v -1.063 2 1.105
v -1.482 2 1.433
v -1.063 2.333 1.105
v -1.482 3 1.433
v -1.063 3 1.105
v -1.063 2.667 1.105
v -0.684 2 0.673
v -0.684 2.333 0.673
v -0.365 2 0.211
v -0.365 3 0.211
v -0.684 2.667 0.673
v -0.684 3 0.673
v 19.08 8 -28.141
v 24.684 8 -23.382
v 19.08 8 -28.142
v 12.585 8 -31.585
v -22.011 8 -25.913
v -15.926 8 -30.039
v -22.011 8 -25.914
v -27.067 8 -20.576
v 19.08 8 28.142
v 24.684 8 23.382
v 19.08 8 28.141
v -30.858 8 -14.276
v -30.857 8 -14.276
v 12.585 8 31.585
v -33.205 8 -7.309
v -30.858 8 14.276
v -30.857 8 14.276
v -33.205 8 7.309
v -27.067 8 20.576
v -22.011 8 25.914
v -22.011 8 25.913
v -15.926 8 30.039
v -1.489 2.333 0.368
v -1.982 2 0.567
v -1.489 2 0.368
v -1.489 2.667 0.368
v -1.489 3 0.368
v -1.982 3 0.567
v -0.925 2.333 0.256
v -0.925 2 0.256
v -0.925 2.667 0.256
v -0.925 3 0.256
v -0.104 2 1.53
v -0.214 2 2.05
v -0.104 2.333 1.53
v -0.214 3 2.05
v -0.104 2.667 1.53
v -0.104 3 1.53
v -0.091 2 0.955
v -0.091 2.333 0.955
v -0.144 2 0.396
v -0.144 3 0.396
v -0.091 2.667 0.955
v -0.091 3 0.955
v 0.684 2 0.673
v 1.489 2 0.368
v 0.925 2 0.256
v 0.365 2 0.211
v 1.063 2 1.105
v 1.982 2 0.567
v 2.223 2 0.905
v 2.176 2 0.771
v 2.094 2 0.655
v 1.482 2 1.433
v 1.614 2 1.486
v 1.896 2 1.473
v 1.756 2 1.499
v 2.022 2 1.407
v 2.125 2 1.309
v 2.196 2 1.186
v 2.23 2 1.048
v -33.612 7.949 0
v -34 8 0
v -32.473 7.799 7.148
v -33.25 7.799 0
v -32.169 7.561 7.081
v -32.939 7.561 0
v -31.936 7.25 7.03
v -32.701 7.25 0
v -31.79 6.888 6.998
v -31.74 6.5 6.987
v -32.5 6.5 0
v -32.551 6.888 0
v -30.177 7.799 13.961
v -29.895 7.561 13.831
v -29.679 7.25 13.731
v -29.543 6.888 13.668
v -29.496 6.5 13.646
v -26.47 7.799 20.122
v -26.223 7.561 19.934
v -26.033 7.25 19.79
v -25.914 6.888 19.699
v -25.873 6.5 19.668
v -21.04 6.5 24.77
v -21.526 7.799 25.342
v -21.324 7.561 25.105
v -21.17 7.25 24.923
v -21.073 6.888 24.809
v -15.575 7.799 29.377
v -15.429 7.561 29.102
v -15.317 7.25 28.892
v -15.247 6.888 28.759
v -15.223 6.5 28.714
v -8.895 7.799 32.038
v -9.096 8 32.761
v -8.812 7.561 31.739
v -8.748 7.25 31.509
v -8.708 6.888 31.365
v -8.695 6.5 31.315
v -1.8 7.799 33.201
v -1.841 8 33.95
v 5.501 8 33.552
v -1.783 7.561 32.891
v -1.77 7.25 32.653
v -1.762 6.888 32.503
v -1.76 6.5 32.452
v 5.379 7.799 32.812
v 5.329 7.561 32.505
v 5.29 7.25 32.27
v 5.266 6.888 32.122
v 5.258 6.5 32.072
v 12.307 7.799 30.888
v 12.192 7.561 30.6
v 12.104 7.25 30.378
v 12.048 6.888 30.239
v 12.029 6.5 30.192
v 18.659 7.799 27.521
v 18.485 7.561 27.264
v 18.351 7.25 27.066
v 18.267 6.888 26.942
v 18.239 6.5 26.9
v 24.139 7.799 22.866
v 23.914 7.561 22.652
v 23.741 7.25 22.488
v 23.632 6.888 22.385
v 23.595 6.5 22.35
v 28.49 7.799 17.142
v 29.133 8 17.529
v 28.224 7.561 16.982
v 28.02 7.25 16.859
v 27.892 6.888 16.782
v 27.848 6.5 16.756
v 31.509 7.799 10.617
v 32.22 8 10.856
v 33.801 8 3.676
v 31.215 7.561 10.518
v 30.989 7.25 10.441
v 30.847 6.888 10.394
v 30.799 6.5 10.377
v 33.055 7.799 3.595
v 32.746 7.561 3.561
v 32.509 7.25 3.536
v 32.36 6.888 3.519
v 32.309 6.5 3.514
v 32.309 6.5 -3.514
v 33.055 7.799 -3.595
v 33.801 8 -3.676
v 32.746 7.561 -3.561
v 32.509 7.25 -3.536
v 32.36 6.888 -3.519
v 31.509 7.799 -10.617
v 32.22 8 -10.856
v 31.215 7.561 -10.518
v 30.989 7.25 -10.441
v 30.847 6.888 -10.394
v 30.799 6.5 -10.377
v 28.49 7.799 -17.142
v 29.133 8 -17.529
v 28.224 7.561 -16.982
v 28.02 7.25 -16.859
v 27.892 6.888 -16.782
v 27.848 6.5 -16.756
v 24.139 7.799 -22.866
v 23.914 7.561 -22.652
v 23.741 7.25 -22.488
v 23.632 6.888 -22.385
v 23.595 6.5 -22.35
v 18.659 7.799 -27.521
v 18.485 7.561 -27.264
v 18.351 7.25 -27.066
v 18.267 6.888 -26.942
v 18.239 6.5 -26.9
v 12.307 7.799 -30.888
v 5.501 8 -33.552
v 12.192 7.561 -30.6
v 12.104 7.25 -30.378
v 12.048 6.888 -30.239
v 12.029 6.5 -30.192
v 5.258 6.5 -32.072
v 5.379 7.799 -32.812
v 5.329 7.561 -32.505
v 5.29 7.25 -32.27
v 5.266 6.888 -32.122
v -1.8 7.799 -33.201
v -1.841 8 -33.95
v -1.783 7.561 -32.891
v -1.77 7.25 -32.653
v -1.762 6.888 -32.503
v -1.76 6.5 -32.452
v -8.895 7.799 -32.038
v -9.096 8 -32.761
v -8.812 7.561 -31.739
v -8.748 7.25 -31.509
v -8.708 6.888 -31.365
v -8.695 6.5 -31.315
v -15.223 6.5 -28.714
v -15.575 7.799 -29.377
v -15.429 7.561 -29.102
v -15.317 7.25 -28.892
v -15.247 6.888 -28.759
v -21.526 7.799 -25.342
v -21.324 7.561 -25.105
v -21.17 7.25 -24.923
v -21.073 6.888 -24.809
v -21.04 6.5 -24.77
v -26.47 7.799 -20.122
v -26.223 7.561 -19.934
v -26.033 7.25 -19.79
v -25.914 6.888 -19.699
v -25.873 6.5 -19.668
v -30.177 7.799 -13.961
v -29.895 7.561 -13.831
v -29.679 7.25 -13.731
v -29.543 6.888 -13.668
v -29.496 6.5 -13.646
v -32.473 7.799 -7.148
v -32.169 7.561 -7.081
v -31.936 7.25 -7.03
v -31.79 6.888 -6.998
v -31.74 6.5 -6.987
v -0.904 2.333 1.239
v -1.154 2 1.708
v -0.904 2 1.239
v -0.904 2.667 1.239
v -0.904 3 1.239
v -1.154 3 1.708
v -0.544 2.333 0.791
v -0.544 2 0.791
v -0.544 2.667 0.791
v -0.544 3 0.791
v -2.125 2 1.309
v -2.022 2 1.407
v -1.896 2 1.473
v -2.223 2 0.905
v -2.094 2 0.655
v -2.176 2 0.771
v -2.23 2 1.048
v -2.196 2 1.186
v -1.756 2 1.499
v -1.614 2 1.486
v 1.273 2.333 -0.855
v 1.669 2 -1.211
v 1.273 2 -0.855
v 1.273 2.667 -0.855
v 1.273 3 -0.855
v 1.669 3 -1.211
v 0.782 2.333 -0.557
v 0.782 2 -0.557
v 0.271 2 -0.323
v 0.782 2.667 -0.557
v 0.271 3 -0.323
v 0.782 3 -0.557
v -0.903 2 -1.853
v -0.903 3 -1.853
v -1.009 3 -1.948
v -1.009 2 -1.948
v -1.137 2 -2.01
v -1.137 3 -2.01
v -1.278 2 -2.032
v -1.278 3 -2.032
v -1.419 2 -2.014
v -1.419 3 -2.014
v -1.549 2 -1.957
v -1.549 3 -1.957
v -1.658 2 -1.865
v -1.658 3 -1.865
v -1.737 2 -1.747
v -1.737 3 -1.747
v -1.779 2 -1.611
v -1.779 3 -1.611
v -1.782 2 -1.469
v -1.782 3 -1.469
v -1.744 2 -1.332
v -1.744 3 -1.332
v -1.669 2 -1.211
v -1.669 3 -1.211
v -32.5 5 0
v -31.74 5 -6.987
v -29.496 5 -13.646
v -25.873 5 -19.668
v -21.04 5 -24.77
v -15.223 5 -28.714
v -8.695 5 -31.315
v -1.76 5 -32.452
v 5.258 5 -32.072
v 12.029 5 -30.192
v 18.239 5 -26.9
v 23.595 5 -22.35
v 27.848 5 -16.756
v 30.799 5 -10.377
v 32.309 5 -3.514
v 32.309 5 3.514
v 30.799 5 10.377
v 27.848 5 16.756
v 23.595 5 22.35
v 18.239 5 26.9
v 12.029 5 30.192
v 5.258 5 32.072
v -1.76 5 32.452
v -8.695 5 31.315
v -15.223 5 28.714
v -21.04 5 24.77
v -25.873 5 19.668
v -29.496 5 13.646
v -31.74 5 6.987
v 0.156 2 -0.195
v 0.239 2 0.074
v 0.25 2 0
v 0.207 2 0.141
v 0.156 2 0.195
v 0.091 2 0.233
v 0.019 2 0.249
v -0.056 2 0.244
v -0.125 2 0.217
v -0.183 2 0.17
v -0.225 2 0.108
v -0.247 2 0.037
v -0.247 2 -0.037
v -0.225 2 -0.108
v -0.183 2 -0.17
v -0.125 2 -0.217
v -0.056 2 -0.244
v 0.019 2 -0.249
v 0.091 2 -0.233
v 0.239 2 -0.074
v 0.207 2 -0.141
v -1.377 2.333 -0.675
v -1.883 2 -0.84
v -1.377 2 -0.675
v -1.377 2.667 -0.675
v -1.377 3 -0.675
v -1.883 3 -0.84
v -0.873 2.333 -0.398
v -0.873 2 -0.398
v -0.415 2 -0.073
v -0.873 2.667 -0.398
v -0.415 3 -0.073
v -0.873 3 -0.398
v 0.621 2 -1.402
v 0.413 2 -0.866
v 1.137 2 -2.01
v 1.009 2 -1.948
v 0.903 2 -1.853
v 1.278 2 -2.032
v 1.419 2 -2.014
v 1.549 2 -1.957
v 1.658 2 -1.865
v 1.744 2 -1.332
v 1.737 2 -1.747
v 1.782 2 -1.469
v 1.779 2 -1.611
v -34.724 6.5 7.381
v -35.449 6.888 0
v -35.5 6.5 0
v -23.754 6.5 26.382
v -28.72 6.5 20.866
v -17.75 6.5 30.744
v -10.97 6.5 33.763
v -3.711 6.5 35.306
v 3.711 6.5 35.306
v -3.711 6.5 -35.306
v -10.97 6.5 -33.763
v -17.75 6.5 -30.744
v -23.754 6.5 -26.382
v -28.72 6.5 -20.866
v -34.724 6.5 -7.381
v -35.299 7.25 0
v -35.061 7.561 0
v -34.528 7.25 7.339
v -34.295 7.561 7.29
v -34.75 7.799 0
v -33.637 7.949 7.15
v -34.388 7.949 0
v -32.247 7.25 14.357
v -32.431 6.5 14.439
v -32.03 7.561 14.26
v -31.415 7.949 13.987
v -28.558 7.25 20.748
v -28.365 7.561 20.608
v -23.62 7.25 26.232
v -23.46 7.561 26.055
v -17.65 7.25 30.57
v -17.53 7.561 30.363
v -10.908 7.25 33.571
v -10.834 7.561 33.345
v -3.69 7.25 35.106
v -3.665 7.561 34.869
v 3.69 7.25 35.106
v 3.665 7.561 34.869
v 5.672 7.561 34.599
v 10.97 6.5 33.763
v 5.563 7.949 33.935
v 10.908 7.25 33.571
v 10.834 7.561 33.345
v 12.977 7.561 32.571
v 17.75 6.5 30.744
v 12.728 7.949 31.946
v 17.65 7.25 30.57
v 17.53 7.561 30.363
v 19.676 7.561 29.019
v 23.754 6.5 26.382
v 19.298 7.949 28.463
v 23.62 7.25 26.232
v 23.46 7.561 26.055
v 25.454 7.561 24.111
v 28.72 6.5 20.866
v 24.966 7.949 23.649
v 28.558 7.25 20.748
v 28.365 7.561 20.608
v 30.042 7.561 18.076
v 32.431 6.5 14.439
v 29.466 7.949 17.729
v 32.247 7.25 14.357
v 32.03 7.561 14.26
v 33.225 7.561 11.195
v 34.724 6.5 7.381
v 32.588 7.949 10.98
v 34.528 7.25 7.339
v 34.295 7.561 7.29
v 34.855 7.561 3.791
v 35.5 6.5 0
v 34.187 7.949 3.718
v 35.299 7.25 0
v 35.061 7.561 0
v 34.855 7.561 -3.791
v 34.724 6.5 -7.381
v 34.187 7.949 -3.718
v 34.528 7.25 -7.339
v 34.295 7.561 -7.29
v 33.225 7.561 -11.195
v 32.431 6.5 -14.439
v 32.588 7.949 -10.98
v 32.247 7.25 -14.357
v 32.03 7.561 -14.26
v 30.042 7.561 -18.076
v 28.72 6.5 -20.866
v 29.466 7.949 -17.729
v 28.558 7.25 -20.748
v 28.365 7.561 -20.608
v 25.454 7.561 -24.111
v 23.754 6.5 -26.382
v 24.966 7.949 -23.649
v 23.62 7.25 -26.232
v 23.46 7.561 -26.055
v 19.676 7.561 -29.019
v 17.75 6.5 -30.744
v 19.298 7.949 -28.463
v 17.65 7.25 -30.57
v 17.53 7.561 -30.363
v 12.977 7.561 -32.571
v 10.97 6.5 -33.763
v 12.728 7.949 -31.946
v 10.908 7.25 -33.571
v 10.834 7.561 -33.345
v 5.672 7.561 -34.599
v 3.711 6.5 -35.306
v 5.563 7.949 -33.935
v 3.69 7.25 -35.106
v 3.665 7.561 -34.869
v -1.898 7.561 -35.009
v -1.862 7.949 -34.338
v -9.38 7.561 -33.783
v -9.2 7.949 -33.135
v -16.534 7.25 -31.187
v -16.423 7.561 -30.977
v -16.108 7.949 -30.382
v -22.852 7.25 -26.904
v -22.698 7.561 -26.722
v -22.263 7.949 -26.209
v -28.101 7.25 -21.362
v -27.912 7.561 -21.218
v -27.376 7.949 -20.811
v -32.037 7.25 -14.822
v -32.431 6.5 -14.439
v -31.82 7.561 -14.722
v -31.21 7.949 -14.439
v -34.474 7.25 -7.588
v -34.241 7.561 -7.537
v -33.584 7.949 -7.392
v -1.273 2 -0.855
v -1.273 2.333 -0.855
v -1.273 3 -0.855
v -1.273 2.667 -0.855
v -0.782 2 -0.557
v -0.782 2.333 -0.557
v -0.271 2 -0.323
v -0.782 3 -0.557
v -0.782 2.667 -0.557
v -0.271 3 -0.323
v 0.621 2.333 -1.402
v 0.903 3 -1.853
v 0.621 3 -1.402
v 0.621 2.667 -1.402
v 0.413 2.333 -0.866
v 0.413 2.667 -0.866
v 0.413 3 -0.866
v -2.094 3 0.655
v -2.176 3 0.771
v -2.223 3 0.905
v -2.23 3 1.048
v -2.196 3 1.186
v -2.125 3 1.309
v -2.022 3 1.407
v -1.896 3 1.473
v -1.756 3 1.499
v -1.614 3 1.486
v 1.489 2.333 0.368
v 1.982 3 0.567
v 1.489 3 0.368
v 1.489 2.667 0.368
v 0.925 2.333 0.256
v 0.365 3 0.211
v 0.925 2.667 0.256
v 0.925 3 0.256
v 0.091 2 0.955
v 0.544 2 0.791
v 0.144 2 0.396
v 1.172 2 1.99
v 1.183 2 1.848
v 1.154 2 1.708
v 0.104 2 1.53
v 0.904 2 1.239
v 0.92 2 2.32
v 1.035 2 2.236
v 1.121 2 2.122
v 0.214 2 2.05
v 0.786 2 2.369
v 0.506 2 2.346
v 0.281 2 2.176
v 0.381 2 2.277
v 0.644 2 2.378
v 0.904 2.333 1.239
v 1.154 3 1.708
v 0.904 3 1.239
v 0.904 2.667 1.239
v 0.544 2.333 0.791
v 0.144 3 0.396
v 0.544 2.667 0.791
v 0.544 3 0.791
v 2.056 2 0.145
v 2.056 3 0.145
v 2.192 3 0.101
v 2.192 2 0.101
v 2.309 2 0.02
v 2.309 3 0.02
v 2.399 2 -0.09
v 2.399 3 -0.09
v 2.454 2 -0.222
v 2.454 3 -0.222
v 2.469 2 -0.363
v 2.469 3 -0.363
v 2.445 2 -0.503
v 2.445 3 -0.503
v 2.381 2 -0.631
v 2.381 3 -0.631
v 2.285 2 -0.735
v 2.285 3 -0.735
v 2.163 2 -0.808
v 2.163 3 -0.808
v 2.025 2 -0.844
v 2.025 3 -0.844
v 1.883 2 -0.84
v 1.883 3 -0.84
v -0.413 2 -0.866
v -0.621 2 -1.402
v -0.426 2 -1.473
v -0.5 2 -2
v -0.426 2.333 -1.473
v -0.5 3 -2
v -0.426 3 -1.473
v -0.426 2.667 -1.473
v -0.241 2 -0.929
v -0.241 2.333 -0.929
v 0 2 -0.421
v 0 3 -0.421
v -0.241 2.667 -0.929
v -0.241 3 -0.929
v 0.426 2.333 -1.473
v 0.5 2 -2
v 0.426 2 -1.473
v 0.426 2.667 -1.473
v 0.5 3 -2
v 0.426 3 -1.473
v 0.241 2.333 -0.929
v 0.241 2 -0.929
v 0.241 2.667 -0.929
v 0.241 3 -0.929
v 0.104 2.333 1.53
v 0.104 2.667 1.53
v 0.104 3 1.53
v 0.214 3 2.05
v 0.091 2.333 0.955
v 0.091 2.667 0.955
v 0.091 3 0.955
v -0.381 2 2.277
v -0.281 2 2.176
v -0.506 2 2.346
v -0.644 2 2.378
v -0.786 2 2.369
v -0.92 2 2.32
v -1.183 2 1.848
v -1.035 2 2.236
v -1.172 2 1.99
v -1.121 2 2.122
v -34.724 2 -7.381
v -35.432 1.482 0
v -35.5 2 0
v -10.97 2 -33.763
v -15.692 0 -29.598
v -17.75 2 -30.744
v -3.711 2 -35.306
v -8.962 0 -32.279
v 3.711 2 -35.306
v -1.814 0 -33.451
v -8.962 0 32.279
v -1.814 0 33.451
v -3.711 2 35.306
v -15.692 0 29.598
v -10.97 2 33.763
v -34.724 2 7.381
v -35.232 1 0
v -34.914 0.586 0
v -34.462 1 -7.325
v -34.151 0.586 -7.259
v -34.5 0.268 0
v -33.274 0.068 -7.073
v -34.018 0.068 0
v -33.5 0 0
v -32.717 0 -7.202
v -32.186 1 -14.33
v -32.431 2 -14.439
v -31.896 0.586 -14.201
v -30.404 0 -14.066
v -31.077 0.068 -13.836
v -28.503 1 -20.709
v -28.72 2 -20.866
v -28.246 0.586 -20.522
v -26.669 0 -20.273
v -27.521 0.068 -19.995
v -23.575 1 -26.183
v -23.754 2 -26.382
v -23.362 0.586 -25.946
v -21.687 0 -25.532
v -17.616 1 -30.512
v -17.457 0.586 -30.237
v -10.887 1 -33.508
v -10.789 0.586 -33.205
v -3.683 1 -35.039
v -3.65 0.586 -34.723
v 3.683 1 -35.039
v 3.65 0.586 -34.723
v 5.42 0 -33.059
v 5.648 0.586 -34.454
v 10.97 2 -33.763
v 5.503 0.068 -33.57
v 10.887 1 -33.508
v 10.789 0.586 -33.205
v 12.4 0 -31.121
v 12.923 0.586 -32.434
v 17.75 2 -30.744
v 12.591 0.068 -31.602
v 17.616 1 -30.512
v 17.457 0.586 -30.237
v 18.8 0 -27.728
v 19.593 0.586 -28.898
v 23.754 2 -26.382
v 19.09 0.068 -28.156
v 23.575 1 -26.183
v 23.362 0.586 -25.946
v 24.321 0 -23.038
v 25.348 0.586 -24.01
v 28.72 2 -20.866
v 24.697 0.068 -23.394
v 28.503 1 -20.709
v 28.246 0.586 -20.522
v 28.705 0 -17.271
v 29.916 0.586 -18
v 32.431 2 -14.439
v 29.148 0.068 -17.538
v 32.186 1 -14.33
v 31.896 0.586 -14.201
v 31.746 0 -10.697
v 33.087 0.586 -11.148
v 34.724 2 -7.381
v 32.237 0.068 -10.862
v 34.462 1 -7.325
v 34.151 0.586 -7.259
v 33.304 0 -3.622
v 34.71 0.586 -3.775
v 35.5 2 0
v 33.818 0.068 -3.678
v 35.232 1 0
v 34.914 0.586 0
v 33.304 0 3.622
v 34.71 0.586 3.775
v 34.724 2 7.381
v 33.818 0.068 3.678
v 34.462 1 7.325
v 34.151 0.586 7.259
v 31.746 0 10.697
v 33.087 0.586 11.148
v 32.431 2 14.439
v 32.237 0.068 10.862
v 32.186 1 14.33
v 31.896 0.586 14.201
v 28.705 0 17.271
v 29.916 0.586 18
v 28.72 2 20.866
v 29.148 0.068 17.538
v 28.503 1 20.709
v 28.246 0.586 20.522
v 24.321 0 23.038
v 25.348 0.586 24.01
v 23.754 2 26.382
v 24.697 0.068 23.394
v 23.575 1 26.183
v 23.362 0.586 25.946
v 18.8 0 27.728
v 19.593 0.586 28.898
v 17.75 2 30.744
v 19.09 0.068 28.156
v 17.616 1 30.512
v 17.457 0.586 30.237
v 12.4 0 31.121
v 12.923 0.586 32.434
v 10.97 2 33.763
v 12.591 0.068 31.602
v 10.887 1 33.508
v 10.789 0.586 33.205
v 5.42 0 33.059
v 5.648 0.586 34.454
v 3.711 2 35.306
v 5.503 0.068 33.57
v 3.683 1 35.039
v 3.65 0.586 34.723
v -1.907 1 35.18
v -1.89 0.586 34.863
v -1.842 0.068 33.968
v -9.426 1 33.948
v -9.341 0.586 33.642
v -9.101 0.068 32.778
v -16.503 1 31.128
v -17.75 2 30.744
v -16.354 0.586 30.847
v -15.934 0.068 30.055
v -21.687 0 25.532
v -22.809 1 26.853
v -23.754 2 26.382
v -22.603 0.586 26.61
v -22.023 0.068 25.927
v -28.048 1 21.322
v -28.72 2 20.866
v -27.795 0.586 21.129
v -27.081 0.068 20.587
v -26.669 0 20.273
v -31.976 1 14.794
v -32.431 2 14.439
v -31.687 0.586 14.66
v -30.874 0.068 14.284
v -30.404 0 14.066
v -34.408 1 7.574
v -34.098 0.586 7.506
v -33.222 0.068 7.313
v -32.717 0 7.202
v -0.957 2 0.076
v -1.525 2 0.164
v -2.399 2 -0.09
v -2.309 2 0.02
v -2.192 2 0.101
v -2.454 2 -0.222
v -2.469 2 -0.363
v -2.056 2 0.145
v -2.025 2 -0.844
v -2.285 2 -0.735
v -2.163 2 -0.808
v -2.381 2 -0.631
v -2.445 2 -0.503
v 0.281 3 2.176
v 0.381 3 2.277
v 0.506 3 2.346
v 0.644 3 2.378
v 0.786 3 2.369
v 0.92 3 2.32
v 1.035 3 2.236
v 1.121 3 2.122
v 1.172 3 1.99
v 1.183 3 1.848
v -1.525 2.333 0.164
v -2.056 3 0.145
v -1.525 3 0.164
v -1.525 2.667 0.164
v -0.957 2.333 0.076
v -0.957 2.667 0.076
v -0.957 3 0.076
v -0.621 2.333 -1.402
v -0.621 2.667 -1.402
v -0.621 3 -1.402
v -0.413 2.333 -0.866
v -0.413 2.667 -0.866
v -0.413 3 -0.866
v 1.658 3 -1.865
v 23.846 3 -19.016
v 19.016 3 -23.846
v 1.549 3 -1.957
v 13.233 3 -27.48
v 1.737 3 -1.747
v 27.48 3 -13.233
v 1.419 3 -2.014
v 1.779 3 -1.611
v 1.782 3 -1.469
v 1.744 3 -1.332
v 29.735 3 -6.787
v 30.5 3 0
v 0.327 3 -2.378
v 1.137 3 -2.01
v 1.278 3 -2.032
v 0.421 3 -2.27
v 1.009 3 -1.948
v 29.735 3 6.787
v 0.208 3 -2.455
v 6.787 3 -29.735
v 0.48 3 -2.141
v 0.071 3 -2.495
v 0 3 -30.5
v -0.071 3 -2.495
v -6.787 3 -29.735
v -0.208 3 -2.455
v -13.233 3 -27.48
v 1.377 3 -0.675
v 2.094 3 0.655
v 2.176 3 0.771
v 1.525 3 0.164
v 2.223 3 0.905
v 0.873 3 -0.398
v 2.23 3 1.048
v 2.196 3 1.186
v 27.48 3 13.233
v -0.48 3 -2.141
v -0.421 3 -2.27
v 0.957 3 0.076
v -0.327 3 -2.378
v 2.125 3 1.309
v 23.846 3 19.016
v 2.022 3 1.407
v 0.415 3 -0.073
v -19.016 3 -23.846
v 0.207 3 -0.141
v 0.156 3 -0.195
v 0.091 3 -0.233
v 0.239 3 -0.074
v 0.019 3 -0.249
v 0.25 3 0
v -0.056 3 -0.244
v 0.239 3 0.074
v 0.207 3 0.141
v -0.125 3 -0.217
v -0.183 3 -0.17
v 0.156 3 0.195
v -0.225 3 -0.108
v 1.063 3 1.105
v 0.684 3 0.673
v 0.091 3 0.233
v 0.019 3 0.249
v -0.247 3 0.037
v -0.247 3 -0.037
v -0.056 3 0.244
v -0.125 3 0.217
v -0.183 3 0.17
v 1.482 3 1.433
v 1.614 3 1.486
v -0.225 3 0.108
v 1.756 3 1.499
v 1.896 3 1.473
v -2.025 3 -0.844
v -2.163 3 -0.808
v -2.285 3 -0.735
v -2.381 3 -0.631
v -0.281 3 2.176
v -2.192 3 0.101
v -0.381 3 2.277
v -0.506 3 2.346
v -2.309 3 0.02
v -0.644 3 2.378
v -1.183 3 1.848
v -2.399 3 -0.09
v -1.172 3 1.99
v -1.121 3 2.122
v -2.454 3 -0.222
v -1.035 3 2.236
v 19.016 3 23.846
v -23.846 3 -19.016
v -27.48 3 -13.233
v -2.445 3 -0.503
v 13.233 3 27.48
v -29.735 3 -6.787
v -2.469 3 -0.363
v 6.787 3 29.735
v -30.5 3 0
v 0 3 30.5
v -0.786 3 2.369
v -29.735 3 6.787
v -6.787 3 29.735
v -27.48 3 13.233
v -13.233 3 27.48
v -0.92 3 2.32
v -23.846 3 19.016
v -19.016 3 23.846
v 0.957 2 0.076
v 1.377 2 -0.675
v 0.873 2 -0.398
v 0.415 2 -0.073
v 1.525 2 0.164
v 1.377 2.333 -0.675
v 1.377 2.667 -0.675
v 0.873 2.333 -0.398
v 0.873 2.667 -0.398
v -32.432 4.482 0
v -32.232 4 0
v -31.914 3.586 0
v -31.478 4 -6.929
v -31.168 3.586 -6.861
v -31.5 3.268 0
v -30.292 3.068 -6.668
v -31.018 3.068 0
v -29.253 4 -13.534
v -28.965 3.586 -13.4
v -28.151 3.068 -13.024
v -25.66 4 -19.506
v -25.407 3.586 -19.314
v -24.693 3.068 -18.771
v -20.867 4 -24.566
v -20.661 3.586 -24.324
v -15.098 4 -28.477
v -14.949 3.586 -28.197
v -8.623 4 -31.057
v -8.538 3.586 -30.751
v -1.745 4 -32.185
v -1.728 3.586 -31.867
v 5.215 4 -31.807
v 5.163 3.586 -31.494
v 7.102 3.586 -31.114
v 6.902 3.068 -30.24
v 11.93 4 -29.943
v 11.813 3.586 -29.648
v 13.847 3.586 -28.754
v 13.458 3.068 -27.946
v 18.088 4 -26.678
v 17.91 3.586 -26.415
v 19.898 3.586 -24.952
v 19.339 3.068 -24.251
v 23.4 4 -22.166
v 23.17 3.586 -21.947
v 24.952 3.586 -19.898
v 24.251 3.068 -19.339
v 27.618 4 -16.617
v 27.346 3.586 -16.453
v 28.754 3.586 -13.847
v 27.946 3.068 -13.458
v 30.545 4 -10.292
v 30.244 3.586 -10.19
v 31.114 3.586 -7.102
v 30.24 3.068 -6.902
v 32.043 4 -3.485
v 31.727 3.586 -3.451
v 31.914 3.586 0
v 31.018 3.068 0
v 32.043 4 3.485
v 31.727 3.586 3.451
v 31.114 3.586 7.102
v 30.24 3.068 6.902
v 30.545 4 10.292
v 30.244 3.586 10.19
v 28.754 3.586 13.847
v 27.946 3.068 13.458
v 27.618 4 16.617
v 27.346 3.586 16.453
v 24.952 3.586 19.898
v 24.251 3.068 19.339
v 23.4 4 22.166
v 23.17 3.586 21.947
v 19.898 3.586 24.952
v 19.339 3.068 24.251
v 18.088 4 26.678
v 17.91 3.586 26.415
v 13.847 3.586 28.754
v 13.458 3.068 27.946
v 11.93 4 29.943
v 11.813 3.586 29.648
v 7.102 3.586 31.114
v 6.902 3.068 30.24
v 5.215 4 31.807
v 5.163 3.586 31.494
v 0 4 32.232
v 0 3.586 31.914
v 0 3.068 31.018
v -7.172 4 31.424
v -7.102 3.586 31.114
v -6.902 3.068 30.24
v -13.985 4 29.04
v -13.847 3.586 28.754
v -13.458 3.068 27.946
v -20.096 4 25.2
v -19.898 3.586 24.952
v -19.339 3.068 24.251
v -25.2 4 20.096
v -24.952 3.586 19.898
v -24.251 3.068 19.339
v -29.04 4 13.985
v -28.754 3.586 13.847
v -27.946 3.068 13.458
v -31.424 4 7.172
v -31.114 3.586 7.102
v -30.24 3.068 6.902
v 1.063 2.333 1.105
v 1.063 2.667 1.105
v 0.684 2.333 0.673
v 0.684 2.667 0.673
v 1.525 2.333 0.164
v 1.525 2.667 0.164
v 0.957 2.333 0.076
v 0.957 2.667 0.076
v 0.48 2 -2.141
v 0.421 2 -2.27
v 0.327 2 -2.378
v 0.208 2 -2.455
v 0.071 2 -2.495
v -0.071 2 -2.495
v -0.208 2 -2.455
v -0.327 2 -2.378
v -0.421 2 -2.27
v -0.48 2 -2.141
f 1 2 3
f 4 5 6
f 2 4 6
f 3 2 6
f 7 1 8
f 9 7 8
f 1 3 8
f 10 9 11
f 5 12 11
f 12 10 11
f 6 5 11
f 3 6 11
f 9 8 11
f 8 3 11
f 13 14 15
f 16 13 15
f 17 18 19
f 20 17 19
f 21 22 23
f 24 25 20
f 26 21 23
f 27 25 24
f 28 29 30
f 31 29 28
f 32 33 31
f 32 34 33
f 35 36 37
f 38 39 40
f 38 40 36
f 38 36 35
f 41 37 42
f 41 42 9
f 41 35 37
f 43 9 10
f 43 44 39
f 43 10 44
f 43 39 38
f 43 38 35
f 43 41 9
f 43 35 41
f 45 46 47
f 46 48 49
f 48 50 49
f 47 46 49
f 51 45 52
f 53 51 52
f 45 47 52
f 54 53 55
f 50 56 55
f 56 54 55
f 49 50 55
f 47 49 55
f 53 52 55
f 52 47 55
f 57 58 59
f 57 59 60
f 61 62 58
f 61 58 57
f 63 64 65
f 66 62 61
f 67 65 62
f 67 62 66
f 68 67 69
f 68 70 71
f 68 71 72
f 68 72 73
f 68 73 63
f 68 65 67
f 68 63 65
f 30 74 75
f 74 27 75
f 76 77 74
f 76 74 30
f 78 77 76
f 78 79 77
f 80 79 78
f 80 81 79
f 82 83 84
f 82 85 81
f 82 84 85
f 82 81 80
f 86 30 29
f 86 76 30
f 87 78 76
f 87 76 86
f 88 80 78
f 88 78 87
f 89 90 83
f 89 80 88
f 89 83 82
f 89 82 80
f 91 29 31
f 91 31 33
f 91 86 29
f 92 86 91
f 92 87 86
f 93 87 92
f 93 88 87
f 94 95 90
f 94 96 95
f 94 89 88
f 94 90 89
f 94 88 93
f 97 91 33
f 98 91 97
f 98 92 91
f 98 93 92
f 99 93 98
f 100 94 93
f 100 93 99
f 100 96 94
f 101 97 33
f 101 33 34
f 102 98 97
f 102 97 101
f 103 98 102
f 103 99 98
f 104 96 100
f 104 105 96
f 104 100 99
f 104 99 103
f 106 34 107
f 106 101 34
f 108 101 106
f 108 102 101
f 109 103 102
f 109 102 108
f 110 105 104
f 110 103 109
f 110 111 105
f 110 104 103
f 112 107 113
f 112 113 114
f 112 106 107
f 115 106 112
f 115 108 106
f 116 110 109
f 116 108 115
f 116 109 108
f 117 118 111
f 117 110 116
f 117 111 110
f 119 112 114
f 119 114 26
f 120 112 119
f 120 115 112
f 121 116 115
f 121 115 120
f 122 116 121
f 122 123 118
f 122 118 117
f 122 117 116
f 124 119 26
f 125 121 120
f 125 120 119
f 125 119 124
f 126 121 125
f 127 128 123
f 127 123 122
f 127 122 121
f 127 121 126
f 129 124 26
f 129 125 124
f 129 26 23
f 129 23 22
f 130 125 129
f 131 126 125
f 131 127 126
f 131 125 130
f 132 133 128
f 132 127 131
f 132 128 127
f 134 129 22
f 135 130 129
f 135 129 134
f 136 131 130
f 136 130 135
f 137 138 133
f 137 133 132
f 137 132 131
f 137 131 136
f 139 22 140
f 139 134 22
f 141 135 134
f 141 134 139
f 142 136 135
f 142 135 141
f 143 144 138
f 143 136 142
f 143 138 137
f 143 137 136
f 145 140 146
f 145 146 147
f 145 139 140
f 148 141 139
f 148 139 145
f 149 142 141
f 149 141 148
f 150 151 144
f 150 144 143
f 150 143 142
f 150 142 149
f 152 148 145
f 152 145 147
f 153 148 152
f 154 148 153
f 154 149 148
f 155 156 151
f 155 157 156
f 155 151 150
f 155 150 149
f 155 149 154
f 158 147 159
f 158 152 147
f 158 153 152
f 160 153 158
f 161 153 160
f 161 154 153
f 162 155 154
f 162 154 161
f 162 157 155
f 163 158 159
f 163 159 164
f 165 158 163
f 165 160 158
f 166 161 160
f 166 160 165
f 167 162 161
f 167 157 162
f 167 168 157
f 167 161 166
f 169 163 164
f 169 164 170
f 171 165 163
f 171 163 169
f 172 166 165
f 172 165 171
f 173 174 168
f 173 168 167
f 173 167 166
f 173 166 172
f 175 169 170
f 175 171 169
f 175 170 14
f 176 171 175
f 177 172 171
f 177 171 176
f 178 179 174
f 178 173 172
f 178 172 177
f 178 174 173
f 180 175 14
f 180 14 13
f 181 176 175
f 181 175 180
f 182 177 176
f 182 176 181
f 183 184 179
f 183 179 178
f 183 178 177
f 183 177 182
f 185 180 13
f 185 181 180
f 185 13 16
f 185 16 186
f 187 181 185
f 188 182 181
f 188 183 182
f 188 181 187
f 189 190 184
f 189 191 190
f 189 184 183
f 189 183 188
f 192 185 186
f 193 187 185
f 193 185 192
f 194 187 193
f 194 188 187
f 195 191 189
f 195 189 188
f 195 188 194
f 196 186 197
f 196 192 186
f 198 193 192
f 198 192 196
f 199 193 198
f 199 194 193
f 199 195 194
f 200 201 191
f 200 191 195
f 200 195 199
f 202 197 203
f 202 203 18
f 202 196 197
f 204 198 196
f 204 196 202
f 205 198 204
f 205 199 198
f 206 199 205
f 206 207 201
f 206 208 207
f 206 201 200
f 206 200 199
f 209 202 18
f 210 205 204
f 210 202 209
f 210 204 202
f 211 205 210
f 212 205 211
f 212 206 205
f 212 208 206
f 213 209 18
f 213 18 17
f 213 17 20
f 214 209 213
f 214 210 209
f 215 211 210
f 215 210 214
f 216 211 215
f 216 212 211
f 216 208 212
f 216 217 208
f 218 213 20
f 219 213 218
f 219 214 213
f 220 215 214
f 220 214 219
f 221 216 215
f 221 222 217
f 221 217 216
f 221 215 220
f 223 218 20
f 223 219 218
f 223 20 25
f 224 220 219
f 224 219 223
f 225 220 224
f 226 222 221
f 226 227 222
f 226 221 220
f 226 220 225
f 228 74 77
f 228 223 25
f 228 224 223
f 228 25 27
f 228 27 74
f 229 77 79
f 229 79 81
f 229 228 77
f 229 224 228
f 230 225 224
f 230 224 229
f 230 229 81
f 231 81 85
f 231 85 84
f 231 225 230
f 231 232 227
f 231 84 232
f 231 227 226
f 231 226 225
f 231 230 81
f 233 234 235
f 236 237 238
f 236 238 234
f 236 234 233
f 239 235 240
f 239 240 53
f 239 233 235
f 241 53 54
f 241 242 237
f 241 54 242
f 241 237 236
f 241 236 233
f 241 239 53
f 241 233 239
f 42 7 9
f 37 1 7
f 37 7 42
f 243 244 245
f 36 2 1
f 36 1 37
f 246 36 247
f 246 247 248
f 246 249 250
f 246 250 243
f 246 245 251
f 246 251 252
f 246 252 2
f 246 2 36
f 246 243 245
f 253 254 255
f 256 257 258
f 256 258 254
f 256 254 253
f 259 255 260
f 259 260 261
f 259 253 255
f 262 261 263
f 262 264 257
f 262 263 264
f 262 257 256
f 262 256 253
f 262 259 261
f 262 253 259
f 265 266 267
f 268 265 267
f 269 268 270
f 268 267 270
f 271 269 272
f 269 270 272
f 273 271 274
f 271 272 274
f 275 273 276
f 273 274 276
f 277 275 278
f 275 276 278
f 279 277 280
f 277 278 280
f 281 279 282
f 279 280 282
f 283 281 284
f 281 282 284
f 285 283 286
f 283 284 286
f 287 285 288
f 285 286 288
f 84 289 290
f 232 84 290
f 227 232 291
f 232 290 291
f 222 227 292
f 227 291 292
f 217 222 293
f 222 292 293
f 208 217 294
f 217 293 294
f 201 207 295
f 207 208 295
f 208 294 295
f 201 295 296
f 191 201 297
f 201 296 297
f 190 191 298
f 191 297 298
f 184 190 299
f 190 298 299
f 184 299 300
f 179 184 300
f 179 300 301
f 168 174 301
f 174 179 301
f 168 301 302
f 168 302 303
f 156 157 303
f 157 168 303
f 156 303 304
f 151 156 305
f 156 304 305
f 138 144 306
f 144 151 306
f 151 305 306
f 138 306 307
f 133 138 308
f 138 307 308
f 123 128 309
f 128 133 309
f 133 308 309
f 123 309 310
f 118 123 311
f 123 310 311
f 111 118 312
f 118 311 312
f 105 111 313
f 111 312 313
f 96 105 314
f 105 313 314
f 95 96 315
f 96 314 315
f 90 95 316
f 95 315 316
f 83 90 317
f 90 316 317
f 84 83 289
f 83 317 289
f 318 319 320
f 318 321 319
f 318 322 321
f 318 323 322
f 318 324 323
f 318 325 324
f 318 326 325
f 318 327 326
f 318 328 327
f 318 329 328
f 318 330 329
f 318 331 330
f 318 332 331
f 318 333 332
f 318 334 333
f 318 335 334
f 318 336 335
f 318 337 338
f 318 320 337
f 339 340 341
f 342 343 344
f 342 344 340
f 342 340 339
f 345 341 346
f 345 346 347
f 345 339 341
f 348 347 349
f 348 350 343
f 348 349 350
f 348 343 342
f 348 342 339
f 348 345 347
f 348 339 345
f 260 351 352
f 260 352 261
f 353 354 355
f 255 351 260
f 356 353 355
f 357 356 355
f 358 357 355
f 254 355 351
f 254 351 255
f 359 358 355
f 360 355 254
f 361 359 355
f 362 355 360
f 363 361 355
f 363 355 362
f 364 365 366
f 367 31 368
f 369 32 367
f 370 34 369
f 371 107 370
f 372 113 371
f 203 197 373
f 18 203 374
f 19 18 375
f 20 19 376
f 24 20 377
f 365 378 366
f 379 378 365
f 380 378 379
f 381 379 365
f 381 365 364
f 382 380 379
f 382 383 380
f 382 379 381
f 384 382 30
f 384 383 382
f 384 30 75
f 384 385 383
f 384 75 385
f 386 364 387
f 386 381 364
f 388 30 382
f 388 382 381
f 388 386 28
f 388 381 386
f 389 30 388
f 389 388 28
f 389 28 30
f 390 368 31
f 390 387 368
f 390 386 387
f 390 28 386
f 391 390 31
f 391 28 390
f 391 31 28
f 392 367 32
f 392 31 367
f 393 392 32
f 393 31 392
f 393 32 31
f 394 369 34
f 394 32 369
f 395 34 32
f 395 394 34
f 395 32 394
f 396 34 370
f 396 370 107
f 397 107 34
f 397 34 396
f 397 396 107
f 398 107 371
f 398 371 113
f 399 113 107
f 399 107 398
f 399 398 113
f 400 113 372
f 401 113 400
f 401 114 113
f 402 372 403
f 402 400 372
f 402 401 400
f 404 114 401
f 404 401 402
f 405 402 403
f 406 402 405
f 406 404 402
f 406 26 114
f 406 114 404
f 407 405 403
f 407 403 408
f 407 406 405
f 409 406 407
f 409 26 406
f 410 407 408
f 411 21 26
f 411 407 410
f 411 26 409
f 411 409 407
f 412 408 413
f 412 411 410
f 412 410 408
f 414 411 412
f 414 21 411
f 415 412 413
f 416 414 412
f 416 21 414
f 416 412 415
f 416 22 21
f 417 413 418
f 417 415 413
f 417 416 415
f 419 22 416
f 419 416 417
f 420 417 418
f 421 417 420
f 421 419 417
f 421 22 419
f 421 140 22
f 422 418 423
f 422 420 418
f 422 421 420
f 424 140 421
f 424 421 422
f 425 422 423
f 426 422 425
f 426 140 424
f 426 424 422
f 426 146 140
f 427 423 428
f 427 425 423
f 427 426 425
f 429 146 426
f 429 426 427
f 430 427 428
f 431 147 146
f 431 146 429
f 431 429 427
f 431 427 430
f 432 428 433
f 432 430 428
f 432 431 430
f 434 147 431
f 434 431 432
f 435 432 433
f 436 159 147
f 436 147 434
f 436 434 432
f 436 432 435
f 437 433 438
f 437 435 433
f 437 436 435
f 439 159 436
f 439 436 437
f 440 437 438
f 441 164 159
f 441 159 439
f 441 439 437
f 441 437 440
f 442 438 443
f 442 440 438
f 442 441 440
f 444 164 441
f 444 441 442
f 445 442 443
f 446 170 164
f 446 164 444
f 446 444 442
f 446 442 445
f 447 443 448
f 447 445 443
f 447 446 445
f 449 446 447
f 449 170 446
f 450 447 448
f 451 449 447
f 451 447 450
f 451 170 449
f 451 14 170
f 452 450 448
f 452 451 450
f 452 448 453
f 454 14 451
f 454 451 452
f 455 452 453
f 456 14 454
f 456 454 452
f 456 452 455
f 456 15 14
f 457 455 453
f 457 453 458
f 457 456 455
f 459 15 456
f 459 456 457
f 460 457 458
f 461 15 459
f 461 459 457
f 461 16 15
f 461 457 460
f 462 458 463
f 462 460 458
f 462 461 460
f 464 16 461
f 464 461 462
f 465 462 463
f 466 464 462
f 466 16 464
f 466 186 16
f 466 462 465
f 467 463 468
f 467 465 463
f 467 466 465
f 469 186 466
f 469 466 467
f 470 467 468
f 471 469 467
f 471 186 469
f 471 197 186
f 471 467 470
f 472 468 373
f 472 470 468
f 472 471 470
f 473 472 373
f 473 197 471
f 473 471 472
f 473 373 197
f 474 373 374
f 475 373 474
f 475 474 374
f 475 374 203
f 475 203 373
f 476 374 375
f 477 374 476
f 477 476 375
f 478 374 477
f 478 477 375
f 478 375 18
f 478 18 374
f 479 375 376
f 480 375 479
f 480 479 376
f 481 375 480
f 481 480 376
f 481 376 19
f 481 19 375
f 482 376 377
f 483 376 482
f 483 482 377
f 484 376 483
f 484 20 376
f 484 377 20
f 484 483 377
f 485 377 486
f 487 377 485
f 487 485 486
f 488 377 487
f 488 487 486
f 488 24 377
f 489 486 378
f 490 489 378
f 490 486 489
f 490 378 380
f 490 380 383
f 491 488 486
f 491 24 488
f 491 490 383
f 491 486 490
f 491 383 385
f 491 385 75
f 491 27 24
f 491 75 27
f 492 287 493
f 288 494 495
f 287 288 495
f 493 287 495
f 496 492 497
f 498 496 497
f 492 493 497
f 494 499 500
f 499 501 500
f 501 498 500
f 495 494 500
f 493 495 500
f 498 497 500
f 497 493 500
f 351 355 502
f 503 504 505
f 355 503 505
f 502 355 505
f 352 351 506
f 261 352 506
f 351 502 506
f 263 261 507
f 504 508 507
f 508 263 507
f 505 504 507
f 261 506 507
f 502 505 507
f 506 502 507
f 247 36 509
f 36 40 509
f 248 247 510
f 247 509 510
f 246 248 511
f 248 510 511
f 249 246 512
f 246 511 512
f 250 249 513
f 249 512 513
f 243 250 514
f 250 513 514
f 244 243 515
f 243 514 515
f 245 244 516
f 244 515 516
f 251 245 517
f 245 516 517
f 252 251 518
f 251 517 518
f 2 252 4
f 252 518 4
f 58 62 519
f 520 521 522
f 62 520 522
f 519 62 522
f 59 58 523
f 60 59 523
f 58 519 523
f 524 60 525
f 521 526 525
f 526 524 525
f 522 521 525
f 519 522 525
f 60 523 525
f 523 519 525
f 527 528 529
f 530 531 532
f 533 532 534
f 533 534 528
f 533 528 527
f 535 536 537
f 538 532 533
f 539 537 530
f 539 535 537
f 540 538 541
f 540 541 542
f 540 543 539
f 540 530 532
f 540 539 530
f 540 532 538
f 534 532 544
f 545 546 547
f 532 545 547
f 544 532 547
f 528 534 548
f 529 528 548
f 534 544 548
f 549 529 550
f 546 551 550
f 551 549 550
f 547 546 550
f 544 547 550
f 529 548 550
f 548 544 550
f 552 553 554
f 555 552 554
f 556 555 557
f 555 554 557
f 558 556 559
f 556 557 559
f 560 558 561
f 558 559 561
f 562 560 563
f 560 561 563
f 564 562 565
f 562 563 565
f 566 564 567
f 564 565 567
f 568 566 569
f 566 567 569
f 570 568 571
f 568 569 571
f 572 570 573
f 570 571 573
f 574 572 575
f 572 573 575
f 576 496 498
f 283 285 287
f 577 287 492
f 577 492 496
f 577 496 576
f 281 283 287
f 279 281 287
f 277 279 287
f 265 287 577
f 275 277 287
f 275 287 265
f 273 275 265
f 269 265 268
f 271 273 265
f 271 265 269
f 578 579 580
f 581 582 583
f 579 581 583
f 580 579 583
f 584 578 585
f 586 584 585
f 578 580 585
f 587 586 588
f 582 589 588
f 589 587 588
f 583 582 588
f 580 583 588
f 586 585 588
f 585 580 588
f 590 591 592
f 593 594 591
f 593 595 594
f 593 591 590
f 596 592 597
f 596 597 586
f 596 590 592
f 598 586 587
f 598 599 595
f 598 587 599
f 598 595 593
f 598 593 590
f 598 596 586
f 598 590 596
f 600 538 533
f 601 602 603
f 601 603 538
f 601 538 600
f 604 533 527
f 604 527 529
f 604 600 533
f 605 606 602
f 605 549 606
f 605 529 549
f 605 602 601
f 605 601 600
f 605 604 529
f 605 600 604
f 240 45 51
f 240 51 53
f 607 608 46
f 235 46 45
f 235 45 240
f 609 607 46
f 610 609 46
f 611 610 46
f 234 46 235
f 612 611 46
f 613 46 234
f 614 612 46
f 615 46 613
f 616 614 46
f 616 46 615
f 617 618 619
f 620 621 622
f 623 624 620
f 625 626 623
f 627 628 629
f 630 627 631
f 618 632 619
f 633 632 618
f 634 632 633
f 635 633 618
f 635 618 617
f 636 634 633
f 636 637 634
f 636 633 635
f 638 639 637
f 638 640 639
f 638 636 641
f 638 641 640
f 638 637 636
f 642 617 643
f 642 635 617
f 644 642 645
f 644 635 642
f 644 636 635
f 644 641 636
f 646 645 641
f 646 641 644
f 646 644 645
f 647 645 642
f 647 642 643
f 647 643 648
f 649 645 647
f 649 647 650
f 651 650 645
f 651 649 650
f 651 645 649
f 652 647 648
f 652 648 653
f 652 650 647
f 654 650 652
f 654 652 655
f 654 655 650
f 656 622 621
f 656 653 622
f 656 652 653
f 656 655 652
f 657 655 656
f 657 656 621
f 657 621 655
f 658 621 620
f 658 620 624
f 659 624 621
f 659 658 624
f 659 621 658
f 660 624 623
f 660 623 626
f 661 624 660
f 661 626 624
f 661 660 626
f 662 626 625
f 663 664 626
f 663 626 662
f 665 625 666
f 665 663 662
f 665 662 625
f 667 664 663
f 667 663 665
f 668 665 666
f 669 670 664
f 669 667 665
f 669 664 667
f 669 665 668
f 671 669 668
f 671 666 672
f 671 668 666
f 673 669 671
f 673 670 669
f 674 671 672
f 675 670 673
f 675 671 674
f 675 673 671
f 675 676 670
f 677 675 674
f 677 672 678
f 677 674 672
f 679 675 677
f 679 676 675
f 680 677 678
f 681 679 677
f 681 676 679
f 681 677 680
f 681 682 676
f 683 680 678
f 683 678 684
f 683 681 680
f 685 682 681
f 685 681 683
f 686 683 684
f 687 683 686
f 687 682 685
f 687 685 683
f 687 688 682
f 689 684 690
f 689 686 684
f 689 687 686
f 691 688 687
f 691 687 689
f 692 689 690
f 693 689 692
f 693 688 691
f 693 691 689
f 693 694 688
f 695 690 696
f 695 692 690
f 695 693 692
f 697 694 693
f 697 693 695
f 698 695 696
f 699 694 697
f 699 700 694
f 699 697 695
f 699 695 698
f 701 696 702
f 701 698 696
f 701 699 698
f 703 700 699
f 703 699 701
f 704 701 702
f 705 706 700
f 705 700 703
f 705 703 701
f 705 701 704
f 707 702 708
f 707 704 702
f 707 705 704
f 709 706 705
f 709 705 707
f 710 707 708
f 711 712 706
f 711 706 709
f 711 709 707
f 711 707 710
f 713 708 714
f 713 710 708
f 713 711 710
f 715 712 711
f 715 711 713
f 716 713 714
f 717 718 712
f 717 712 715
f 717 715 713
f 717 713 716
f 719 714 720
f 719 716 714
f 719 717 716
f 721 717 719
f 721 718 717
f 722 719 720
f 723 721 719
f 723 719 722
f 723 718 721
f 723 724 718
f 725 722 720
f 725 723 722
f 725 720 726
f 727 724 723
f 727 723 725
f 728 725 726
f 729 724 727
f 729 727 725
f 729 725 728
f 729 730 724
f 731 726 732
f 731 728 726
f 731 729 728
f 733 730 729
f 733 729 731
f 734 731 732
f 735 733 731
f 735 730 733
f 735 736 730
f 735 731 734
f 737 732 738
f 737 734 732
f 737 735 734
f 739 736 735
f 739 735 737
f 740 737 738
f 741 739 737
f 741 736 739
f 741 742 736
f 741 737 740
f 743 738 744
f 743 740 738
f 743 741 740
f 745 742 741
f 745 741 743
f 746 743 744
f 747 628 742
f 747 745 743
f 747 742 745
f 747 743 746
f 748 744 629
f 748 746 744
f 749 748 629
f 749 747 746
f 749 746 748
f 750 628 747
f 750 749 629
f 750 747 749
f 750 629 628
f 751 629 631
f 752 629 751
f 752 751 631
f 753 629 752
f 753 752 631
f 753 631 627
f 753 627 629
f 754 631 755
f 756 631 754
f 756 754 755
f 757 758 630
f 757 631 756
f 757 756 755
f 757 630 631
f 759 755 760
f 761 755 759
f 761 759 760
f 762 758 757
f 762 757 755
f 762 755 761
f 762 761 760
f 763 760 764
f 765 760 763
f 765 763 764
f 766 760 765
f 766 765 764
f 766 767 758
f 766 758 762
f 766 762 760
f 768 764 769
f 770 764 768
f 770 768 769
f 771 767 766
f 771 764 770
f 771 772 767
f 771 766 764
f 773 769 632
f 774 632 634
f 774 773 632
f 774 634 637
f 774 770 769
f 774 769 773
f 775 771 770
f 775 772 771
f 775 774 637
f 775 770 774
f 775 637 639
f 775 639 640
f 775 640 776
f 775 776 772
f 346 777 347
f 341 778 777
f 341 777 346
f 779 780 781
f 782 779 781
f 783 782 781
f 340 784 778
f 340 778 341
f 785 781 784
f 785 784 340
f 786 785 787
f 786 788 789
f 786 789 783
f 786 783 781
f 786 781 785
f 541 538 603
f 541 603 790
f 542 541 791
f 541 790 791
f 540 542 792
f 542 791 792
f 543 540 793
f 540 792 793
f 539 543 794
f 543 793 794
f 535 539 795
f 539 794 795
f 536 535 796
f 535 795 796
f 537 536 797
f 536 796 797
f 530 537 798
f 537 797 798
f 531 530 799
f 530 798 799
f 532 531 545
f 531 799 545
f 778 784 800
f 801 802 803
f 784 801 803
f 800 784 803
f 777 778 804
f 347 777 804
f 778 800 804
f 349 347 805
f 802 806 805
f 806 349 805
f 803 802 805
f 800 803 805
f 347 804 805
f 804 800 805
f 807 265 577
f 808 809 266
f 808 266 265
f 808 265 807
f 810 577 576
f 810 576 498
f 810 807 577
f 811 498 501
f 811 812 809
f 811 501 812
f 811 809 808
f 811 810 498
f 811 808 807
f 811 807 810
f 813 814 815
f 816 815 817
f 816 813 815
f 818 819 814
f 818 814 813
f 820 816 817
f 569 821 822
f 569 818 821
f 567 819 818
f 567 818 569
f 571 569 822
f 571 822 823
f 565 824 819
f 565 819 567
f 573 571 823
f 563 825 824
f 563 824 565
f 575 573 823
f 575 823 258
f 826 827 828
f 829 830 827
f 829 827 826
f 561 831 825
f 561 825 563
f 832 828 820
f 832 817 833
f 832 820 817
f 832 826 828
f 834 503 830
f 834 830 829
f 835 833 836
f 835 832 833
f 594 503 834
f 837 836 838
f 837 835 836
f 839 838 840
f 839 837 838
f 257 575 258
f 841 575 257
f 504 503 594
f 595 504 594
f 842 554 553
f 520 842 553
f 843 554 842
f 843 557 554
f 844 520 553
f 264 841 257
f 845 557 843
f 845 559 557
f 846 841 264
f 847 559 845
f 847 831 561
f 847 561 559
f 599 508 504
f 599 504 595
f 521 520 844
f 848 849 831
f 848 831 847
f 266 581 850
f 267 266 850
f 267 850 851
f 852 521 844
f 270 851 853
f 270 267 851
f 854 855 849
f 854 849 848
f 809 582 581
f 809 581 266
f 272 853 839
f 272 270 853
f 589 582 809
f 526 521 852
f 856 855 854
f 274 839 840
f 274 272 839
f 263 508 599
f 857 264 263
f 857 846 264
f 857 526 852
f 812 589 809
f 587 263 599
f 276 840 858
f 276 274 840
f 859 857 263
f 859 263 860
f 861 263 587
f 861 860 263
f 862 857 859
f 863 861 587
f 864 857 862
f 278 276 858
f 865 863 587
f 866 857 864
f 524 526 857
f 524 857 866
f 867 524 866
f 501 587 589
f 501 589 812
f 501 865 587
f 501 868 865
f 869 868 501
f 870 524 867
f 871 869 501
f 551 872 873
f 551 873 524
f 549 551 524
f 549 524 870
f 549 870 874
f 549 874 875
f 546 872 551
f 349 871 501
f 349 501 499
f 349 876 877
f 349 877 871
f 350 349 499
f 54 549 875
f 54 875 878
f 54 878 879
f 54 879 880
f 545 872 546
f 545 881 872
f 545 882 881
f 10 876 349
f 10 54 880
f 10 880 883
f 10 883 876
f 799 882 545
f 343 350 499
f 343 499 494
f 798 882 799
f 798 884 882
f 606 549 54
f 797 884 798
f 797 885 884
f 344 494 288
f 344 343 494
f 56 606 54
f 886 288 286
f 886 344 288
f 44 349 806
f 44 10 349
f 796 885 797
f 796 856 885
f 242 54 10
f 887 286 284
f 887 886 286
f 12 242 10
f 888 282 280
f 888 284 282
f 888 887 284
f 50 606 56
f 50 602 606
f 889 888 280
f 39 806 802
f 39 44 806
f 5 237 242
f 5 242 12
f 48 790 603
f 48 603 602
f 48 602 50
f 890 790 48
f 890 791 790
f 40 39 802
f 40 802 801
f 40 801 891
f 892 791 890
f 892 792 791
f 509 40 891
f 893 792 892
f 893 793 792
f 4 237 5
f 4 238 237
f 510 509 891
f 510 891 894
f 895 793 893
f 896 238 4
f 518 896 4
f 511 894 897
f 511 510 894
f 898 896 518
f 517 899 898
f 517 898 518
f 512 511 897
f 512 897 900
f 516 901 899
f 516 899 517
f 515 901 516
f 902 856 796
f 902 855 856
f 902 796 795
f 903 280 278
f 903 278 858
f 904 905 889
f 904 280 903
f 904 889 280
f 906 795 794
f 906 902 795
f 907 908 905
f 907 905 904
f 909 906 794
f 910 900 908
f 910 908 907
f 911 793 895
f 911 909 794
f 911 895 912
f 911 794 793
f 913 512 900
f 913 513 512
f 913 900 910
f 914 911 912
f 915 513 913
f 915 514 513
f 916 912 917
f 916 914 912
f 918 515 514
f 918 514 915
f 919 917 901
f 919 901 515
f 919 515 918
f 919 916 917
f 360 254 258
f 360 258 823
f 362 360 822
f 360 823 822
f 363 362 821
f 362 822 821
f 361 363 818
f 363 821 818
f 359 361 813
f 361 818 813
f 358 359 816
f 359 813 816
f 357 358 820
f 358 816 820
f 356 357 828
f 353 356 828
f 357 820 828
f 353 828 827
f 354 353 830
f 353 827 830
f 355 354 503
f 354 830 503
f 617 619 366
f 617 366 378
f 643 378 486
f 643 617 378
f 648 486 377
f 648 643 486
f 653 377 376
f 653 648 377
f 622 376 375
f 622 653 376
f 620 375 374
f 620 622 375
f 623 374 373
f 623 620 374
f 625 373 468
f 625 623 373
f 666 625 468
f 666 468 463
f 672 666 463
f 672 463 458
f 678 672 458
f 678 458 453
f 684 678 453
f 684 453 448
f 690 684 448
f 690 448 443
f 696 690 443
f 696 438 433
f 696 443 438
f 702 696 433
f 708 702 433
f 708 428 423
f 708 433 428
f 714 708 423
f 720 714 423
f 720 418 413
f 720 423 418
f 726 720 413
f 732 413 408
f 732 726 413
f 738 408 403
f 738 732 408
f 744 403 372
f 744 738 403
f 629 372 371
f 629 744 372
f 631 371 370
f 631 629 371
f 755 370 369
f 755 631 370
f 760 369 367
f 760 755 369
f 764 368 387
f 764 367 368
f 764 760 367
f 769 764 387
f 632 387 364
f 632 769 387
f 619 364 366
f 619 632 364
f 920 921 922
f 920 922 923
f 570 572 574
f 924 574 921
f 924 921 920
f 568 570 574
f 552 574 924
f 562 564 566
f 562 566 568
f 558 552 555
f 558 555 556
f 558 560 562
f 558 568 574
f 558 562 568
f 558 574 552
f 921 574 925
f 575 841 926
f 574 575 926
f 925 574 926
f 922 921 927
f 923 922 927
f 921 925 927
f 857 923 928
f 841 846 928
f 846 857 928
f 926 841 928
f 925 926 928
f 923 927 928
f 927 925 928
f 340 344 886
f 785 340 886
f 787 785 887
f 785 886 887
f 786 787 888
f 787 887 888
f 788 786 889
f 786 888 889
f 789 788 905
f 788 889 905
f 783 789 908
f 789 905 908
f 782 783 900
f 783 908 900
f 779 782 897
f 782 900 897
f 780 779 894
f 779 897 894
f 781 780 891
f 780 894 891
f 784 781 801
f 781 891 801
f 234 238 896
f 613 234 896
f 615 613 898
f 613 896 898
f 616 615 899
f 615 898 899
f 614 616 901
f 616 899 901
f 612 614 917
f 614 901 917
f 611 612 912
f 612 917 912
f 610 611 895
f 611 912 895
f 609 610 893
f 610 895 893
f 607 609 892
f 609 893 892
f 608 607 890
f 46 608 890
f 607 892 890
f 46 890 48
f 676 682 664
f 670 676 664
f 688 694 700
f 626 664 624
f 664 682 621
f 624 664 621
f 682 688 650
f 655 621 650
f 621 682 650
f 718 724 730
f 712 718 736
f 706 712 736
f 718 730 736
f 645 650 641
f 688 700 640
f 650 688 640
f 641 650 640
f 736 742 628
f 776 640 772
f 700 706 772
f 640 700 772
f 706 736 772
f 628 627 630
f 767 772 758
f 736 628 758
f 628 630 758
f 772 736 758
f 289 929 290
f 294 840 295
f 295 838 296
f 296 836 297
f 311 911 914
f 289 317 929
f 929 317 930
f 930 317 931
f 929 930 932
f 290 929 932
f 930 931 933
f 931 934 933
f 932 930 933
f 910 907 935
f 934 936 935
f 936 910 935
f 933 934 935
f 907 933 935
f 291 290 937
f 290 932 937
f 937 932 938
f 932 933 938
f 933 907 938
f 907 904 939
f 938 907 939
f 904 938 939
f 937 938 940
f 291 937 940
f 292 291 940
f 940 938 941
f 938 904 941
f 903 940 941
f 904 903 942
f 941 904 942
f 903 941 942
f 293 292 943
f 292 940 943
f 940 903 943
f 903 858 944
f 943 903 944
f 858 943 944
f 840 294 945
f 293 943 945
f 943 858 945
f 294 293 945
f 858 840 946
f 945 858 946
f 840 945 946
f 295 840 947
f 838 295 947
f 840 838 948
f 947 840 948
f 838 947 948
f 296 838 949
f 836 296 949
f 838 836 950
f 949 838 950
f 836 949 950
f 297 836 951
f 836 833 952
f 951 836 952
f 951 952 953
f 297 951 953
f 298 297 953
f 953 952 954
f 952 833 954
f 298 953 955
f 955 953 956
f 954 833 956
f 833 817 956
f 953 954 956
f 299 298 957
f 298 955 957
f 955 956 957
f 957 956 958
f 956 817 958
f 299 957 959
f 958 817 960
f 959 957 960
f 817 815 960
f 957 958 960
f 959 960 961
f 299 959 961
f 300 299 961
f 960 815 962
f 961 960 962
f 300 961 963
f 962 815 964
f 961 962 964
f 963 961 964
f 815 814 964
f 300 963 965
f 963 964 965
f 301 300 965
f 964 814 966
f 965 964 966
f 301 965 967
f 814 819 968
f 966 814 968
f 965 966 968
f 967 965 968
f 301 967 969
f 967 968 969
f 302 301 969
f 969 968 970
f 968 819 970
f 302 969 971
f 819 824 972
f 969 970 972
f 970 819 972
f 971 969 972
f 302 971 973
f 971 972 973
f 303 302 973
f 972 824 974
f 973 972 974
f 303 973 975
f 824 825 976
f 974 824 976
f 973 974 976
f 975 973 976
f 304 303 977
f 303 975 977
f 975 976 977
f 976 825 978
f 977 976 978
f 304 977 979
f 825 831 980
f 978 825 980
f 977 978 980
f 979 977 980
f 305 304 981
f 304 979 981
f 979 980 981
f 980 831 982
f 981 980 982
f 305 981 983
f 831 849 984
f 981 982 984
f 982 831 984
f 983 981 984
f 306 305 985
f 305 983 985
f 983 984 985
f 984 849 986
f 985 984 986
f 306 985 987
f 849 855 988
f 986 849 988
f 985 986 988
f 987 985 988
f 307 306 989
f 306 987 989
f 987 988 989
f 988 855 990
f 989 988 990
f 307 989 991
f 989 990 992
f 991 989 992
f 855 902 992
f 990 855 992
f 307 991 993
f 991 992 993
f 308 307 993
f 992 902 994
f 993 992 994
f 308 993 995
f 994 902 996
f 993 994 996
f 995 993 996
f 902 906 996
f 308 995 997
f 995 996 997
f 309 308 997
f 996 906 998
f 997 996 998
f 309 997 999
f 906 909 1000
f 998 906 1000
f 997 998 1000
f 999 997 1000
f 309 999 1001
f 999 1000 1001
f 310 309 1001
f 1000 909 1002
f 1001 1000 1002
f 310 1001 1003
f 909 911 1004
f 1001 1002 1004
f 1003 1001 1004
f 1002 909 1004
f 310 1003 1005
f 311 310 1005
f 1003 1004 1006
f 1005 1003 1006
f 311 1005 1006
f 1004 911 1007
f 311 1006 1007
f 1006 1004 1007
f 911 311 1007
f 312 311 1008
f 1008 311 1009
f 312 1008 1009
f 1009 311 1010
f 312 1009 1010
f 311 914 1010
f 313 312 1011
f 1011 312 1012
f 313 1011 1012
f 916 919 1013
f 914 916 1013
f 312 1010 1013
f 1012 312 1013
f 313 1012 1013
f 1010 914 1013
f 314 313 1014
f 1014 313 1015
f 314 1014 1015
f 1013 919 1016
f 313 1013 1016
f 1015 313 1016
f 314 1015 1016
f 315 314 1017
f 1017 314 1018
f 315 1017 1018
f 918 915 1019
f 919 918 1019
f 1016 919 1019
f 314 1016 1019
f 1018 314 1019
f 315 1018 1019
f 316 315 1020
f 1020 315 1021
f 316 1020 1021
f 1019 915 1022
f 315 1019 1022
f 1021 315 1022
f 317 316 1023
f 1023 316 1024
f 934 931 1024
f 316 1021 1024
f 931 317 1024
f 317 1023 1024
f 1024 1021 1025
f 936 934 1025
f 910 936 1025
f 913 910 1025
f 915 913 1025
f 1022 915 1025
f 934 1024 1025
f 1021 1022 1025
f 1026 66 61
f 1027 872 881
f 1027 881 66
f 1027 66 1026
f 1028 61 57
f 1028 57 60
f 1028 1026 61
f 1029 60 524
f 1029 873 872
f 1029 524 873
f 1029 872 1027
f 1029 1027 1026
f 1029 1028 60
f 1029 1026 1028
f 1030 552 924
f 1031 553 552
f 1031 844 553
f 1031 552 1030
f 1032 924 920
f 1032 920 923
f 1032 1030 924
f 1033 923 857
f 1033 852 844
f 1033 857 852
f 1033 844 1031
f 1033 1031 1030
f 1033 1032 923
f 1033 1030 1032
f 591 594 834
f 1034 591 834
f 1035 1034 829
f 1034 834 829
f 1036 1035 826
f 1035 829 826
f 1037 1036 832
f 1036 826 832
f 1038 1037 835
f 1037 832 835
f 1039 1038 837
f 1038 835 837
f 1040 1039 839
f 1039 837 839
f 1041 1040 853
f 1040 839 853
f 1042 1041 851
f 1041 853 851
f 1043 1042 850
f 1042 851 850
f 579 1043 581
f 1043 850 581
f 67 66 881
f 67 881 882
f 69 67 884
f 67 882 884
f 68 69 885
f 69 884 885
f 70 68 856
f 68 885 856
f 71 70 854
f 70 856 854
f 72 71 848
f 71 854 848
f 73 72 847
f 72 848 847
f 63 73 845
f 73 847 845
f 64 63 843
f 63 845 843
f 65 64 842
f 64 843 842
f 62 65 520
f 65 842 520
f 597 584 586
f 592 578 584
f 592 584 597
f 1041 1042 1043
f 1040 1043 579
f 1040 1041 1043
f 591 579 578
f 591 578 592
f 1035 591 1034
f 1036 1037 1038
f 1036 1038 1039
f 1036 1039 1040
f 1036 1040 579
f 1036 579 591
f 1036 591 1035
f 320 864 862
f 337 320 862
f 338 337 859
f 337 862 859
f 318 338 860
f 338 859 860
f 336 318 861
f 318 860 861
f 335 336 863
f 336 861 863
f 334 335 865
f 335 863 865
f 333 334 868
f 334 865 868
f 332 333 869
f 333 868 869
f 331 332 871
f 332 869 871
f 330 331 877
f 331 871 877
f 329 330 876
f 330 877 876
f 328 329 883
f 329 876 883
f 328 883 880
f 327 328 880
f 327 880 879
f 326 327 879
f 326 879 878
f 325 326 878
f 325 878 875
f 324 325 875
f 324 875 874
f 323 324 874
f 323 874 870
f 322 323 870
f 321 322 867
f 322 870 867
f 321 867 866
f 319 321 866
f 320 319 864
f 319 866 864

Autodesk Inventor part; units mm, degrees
ref_plane "YZ Plane" through (0, 0, 0) normal (1, 0, 0) x (0, 1, 0)
ref_plane "XZ Plane" through (0, 0, 0) normal (0, 1, 0) x (-1, 0, 0)
ref_plane "XY Plane" through (0, 0, 0) normal (0, 0, 1) x (1, 0, 0)
sketch "Sketch1" plane through (0, 0, 0) normal (0, 1, 0) x (-1, 0, 0)
  circle A0 centre (0, 0) radius 32.5
  circle A1 centre (0, 0) radius 35.5
  dimension "d0" = 65
  dimension "d1" = 71
extrude "Extrusion1" add sketch "Sketch1" along normal blind 8
extrude "Extrusion2" add sketch "Sketch1" along normal blind 3 contours A0
fillet "Fillet1" radius 2 2 edges at (35.5, 0, 0) (32.5, 3, 0)
fillet "Fillet2" radius 1.5 2 edges at (32.5, 8, 0) (35.5, 8, 0)
sketch "Sketch2" plane through (0, 3, 0) normal (0, 1, 0) x (1, 0, 0)
  circle A0 centre (0, 0) radius 0.25
  circle A1 centre (0, 0) radius 2.5
  circle A2 centre (0, 2) radius 0.5
  line L0 (-0.5, 2) -> (-0.5, 1.5) construction
  line L1 (-0.5, 1.5) -> (-0.25, 0.892563) construction
  line L2 (-0.25, 0.892563) -> (0, 0.421283) construction
  spline S0 degree 3 poles (-0.5, 2) (-0.5, 1.5) (-0.25, 0.892563) (0, 0.421283) knots 1 1 1 1 2 2 2 2
  line L3 (-0.5, 1.5) -> (0.5, 1.5)
  line L4 (-0.25, 0.892563) -> (0.25, 0.892563)
  line L5 (0.5, 2) -> (0.5, 1.5) construction
  line L6 (0.5, 1.5) -> (0.25, 0.892563) construction
  line L7 (0.25, 0.892563) -> (0, 0.421283) construction
  spline S1 degree 3 poles (0.5, 2) (0.5, 1.5) (0.25, 0.892563) (0, 0.421283) knots 1 1 1 1 2 2 2 2
  dimension "d12" = 0.5
  dimension "d13" = 5
sketch "Sketch2 outline for Extrusion4" plane through (0, 3, 0) normal (0, 1, 0) x (1, 0, 0)
  circle A0 centre (0, 0) radius 0.25
  spline S0 degree 3 poles (0.5, 2) (0.5, 1.5) (0.25, 0.892563) (0, 0.421283) knots 0 0 0 0 1 1 1 1
  spline S1 degree 3 poles (-0.5, 2) (-0.5, 1.5) (-0.25, 0.892563) (0, 0.421283) knots 0 0 0 0 1 1 1 1
  arc A1 (0.5, 2) -> (-0.5, 2) centre (0, 2) ccw
extrude "Extrusion4" cut sketch "Sketch2 outline for Extrusion4" against normal blind 1
pattern_circular "Circular Pattern1" count 9 over 360 about axis through (0, -10, 0) along (0, 1, 0) of "Extrusion4"
properties part number "Orchid Coaster V4"
